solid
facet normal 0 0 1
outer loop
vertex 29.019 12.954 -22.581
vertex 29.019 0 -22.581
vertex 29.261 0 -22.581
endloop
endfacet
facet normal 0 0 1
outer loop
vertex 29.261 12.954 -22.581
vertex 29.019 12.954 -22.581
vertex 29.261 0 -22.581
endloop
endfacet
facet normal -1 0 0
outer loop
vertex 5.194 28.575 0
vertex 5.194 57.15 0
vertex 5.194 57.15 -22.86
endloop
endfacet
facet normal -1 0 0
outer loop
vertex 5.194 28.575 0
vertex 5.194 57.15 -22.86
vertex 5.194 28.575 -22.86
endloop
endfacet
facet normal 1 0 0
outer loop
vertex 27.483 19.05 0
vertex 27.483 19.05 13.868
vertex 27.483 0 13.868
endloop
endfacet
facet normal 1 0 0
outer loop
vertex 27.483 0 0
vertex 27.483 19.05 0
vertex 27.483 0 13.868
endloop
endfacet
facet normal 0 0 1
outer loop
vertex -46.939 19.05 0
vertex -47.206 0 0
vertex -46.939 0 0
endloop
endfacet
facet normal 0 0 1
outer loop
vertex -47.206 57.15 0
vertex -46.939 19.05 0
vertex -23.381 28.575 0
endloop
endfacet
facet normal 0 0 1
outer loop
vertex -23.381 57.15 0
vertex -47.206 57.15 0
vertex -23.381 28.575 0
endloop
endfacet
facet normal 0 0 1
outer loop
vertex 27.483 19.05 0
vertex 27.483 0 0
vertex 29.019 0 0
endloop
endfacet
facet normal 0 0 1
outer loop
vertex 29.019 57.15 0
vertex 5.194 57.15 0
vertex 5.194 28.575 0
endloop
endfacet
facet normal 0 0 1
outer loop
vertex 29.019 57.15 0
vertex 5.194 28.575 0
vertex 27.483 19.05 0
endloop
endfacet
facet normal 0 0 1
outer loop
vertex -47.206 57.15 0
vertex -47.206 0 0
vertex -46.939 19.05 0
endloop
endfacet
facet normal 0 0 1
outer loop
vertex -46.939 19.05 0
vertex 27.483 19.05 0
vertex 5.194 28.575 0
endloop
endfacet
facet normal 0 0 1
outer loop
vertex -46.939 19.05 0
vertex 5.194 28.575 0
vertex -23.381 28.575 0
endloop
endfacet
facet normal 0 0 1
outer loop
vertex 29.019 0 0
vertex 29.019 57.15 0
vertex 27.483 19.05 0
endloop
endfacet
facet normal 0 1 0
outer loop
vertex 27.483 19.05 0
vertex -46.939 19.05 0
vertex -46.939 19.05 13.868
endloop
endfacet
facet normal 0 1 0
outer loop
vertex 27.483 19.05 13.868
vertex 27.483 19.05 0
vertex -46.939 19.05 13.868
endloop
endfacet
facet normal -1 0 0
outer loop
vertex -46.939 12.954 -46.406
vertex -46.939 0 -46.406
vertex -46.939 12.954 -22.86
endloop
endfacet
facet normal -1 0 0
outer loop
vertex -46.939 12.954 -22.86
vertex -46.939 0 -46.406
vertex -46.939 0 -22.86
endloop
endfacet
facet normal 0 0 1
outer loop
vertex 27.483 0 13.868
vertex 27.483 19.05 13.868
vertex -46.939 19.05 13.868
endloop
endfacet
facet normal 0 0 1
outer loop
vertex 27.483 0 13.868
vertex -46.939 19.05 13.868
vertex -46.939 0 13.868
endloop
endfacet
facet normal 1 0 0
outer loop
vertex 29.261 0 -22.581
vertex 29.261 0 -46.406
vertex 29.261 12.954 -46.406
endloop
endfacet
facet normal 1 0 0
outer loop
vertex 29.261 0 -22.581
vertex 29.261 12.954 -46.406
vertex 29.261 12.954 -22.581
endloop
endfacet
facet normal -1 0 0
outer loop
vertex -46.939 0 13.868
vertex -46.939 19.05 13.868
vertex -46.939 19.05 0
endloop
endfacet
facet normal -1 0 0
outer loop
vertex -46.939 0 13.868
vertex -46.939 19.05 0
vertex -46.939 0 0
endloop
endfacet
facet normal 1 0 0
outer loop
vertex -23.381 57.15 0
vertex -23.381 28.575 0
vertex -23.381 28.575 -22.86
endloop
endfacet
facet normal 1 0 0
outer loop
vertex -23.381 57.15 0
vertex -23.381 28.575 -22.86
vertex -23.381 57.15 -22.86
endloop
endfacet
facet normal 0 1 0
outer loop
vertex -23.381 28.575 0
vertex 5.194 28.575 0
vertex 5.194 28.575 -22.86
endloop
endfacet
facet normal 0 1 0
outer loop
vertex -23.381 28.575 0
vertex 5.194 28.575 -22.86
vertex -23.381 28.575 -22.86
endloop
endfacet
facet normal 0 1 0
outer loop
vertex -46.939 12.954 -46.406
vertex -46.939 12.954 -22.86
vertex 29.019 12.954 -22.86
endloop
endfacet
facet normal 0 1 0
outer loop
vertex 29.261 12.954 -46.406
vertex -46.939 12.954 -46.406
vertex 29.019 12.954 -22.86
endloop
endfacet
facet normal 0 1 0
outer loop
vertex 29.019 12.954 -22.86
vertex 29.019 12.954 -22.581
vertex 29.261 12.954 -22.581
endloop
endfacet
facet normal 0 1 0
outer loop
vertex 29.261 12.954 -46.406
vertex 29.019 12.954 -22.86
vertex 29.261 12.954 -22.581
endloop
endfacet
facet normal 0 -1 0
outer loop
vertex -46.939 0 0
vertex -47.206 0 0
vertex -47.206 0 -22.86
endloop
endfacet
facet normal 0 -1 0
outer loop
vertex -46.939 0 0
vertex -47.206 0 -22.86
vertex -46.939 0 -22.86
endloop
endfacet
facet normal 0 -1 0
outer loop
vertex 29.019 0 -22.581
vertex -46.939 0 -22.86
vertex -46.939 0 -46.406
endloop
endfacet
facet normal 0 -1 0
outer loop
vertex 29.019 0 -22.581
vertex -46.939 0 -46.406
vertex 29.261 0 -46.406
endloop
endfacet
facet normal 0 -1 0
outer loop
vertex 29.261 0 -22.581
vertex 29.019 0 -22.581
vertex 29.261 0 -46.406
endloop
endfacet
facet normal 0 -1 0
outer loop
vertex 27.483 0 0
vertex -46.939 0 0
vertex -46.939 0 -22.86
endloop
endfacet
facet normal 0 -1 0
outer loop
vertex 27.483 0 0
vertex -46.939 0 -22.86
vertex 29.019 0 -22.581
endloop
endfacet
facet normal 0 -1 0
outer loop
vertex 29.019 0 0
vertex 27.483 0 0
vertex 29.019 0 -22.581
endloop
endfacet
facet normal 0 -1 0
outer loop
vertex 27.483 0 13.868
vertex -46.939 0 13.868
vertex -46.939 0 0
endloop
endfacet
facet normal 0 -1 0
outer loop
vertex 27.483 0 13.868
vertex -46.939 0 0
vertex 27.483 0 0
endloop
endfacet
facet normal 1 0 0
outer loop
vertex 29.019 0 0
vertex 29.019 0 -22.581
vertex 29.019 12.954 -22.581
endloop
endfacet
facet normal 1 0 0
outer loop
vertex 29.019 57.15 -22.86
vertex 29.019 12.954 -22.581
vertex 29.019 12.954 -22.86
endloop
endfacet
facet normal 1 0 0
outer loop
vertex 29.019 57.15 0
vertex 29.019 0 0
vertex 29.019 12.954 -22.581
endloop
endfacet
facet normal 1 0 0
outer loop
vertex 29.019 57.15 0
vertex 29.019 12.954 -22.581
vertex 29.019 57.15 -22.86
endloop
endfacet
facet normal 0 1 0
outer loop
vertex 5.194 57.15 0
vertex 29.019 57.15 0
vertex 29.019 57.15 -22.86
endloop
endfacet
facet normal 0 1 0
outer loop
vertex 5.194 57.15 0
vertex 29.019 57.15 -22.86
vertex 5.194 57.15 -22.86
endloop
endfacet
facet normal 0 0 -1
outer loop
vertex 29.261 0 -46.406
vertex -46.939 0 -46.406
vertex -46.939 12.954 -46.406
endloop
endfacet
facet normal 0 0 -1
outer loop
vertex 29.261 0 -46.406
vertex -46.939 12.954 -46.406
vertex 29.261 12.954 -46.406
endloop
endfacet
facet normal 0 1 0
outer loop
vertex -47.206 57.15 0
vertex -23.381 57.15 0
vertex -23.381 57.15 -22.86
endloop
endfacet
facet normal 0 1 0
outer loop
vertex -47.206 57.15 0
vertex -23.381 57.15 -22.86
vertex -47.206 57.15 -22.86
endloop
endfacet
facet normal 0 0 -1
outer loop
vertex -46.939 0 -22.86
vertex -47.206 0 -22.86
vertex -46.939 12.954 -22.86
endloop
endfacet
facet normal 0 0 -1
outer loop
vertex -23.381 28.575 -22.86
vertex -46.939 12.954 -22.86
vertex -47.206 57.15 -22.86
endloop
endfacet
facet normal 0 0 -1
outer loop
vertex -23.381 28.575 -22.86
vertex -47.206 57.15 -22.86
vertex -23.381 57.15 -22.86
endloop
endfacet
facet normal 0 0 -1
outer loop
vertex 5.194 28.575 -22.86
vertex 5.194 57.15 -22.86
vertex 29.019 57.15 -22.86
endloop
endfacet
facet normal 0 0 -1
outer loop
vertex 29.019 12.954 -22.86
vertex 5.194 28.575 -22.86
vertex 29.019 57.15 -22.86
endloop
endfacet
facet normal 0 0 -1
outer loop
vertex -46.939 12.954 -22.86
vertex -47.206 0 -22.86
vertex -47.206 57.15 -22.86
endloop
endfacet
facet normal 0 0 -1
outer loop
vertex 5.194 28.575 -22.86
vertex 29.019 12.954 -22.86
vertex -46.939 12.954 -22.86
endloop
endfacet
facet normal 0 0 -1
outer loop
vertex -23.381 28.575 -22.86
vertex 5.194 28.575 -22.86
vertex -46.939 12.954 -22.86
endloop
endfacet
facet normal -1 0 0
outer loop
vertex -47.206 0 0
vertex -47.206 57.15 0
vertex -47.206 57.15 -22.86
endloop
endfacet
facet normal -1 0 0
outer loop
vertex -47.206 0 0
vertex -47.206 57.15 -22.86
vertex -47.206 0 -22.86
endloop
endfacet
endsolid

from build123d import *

# Parameters (mm, degrees)
F2_DEPTH = 22.86
F0_W     = 76.2
F0_H     = 23.8252
F3_DEPTH = 12.954
F4_W     = 19.05
F4_H     = 13.8684
F5_DEPTH = 74.422


with BuildPart() as f2:
    # F1 (on Top) → F2 (new body)
    with BuildSketch(Plane.XY):
        Polygon((-47.205903, 57.15), (-47.205903, 0), (29.019497, 0), (29.019497, 57.15), (5.194297, 57.15), (5.194297, 28.575), (-23.380703, 28.575), (-23.380703, 57.15), align=None)
    extrude(amount=-F2_DEPTH)

    # F0 (on Front) → F3 (join)
    with BuildSketch(Plane.XZ):
        with Locations((-8.839202, -34.4932)):
            Rectangle(F0_W, F0_H)
    extrude(amount=-F3_DEPTH)

    # F4 (on face) → F5 (join)
    with BuildSketch(Plane(origin=(-46.939202, 0, 0), x_dir=(0, -1, 0), z_dir=(-1, 0, 0))):
        with Locations((-9.525, 6.9342)):
            Rectangle(F4_W, F4_H)
    extrude(amount=-F5_DEPTH)


solid = f2.part
